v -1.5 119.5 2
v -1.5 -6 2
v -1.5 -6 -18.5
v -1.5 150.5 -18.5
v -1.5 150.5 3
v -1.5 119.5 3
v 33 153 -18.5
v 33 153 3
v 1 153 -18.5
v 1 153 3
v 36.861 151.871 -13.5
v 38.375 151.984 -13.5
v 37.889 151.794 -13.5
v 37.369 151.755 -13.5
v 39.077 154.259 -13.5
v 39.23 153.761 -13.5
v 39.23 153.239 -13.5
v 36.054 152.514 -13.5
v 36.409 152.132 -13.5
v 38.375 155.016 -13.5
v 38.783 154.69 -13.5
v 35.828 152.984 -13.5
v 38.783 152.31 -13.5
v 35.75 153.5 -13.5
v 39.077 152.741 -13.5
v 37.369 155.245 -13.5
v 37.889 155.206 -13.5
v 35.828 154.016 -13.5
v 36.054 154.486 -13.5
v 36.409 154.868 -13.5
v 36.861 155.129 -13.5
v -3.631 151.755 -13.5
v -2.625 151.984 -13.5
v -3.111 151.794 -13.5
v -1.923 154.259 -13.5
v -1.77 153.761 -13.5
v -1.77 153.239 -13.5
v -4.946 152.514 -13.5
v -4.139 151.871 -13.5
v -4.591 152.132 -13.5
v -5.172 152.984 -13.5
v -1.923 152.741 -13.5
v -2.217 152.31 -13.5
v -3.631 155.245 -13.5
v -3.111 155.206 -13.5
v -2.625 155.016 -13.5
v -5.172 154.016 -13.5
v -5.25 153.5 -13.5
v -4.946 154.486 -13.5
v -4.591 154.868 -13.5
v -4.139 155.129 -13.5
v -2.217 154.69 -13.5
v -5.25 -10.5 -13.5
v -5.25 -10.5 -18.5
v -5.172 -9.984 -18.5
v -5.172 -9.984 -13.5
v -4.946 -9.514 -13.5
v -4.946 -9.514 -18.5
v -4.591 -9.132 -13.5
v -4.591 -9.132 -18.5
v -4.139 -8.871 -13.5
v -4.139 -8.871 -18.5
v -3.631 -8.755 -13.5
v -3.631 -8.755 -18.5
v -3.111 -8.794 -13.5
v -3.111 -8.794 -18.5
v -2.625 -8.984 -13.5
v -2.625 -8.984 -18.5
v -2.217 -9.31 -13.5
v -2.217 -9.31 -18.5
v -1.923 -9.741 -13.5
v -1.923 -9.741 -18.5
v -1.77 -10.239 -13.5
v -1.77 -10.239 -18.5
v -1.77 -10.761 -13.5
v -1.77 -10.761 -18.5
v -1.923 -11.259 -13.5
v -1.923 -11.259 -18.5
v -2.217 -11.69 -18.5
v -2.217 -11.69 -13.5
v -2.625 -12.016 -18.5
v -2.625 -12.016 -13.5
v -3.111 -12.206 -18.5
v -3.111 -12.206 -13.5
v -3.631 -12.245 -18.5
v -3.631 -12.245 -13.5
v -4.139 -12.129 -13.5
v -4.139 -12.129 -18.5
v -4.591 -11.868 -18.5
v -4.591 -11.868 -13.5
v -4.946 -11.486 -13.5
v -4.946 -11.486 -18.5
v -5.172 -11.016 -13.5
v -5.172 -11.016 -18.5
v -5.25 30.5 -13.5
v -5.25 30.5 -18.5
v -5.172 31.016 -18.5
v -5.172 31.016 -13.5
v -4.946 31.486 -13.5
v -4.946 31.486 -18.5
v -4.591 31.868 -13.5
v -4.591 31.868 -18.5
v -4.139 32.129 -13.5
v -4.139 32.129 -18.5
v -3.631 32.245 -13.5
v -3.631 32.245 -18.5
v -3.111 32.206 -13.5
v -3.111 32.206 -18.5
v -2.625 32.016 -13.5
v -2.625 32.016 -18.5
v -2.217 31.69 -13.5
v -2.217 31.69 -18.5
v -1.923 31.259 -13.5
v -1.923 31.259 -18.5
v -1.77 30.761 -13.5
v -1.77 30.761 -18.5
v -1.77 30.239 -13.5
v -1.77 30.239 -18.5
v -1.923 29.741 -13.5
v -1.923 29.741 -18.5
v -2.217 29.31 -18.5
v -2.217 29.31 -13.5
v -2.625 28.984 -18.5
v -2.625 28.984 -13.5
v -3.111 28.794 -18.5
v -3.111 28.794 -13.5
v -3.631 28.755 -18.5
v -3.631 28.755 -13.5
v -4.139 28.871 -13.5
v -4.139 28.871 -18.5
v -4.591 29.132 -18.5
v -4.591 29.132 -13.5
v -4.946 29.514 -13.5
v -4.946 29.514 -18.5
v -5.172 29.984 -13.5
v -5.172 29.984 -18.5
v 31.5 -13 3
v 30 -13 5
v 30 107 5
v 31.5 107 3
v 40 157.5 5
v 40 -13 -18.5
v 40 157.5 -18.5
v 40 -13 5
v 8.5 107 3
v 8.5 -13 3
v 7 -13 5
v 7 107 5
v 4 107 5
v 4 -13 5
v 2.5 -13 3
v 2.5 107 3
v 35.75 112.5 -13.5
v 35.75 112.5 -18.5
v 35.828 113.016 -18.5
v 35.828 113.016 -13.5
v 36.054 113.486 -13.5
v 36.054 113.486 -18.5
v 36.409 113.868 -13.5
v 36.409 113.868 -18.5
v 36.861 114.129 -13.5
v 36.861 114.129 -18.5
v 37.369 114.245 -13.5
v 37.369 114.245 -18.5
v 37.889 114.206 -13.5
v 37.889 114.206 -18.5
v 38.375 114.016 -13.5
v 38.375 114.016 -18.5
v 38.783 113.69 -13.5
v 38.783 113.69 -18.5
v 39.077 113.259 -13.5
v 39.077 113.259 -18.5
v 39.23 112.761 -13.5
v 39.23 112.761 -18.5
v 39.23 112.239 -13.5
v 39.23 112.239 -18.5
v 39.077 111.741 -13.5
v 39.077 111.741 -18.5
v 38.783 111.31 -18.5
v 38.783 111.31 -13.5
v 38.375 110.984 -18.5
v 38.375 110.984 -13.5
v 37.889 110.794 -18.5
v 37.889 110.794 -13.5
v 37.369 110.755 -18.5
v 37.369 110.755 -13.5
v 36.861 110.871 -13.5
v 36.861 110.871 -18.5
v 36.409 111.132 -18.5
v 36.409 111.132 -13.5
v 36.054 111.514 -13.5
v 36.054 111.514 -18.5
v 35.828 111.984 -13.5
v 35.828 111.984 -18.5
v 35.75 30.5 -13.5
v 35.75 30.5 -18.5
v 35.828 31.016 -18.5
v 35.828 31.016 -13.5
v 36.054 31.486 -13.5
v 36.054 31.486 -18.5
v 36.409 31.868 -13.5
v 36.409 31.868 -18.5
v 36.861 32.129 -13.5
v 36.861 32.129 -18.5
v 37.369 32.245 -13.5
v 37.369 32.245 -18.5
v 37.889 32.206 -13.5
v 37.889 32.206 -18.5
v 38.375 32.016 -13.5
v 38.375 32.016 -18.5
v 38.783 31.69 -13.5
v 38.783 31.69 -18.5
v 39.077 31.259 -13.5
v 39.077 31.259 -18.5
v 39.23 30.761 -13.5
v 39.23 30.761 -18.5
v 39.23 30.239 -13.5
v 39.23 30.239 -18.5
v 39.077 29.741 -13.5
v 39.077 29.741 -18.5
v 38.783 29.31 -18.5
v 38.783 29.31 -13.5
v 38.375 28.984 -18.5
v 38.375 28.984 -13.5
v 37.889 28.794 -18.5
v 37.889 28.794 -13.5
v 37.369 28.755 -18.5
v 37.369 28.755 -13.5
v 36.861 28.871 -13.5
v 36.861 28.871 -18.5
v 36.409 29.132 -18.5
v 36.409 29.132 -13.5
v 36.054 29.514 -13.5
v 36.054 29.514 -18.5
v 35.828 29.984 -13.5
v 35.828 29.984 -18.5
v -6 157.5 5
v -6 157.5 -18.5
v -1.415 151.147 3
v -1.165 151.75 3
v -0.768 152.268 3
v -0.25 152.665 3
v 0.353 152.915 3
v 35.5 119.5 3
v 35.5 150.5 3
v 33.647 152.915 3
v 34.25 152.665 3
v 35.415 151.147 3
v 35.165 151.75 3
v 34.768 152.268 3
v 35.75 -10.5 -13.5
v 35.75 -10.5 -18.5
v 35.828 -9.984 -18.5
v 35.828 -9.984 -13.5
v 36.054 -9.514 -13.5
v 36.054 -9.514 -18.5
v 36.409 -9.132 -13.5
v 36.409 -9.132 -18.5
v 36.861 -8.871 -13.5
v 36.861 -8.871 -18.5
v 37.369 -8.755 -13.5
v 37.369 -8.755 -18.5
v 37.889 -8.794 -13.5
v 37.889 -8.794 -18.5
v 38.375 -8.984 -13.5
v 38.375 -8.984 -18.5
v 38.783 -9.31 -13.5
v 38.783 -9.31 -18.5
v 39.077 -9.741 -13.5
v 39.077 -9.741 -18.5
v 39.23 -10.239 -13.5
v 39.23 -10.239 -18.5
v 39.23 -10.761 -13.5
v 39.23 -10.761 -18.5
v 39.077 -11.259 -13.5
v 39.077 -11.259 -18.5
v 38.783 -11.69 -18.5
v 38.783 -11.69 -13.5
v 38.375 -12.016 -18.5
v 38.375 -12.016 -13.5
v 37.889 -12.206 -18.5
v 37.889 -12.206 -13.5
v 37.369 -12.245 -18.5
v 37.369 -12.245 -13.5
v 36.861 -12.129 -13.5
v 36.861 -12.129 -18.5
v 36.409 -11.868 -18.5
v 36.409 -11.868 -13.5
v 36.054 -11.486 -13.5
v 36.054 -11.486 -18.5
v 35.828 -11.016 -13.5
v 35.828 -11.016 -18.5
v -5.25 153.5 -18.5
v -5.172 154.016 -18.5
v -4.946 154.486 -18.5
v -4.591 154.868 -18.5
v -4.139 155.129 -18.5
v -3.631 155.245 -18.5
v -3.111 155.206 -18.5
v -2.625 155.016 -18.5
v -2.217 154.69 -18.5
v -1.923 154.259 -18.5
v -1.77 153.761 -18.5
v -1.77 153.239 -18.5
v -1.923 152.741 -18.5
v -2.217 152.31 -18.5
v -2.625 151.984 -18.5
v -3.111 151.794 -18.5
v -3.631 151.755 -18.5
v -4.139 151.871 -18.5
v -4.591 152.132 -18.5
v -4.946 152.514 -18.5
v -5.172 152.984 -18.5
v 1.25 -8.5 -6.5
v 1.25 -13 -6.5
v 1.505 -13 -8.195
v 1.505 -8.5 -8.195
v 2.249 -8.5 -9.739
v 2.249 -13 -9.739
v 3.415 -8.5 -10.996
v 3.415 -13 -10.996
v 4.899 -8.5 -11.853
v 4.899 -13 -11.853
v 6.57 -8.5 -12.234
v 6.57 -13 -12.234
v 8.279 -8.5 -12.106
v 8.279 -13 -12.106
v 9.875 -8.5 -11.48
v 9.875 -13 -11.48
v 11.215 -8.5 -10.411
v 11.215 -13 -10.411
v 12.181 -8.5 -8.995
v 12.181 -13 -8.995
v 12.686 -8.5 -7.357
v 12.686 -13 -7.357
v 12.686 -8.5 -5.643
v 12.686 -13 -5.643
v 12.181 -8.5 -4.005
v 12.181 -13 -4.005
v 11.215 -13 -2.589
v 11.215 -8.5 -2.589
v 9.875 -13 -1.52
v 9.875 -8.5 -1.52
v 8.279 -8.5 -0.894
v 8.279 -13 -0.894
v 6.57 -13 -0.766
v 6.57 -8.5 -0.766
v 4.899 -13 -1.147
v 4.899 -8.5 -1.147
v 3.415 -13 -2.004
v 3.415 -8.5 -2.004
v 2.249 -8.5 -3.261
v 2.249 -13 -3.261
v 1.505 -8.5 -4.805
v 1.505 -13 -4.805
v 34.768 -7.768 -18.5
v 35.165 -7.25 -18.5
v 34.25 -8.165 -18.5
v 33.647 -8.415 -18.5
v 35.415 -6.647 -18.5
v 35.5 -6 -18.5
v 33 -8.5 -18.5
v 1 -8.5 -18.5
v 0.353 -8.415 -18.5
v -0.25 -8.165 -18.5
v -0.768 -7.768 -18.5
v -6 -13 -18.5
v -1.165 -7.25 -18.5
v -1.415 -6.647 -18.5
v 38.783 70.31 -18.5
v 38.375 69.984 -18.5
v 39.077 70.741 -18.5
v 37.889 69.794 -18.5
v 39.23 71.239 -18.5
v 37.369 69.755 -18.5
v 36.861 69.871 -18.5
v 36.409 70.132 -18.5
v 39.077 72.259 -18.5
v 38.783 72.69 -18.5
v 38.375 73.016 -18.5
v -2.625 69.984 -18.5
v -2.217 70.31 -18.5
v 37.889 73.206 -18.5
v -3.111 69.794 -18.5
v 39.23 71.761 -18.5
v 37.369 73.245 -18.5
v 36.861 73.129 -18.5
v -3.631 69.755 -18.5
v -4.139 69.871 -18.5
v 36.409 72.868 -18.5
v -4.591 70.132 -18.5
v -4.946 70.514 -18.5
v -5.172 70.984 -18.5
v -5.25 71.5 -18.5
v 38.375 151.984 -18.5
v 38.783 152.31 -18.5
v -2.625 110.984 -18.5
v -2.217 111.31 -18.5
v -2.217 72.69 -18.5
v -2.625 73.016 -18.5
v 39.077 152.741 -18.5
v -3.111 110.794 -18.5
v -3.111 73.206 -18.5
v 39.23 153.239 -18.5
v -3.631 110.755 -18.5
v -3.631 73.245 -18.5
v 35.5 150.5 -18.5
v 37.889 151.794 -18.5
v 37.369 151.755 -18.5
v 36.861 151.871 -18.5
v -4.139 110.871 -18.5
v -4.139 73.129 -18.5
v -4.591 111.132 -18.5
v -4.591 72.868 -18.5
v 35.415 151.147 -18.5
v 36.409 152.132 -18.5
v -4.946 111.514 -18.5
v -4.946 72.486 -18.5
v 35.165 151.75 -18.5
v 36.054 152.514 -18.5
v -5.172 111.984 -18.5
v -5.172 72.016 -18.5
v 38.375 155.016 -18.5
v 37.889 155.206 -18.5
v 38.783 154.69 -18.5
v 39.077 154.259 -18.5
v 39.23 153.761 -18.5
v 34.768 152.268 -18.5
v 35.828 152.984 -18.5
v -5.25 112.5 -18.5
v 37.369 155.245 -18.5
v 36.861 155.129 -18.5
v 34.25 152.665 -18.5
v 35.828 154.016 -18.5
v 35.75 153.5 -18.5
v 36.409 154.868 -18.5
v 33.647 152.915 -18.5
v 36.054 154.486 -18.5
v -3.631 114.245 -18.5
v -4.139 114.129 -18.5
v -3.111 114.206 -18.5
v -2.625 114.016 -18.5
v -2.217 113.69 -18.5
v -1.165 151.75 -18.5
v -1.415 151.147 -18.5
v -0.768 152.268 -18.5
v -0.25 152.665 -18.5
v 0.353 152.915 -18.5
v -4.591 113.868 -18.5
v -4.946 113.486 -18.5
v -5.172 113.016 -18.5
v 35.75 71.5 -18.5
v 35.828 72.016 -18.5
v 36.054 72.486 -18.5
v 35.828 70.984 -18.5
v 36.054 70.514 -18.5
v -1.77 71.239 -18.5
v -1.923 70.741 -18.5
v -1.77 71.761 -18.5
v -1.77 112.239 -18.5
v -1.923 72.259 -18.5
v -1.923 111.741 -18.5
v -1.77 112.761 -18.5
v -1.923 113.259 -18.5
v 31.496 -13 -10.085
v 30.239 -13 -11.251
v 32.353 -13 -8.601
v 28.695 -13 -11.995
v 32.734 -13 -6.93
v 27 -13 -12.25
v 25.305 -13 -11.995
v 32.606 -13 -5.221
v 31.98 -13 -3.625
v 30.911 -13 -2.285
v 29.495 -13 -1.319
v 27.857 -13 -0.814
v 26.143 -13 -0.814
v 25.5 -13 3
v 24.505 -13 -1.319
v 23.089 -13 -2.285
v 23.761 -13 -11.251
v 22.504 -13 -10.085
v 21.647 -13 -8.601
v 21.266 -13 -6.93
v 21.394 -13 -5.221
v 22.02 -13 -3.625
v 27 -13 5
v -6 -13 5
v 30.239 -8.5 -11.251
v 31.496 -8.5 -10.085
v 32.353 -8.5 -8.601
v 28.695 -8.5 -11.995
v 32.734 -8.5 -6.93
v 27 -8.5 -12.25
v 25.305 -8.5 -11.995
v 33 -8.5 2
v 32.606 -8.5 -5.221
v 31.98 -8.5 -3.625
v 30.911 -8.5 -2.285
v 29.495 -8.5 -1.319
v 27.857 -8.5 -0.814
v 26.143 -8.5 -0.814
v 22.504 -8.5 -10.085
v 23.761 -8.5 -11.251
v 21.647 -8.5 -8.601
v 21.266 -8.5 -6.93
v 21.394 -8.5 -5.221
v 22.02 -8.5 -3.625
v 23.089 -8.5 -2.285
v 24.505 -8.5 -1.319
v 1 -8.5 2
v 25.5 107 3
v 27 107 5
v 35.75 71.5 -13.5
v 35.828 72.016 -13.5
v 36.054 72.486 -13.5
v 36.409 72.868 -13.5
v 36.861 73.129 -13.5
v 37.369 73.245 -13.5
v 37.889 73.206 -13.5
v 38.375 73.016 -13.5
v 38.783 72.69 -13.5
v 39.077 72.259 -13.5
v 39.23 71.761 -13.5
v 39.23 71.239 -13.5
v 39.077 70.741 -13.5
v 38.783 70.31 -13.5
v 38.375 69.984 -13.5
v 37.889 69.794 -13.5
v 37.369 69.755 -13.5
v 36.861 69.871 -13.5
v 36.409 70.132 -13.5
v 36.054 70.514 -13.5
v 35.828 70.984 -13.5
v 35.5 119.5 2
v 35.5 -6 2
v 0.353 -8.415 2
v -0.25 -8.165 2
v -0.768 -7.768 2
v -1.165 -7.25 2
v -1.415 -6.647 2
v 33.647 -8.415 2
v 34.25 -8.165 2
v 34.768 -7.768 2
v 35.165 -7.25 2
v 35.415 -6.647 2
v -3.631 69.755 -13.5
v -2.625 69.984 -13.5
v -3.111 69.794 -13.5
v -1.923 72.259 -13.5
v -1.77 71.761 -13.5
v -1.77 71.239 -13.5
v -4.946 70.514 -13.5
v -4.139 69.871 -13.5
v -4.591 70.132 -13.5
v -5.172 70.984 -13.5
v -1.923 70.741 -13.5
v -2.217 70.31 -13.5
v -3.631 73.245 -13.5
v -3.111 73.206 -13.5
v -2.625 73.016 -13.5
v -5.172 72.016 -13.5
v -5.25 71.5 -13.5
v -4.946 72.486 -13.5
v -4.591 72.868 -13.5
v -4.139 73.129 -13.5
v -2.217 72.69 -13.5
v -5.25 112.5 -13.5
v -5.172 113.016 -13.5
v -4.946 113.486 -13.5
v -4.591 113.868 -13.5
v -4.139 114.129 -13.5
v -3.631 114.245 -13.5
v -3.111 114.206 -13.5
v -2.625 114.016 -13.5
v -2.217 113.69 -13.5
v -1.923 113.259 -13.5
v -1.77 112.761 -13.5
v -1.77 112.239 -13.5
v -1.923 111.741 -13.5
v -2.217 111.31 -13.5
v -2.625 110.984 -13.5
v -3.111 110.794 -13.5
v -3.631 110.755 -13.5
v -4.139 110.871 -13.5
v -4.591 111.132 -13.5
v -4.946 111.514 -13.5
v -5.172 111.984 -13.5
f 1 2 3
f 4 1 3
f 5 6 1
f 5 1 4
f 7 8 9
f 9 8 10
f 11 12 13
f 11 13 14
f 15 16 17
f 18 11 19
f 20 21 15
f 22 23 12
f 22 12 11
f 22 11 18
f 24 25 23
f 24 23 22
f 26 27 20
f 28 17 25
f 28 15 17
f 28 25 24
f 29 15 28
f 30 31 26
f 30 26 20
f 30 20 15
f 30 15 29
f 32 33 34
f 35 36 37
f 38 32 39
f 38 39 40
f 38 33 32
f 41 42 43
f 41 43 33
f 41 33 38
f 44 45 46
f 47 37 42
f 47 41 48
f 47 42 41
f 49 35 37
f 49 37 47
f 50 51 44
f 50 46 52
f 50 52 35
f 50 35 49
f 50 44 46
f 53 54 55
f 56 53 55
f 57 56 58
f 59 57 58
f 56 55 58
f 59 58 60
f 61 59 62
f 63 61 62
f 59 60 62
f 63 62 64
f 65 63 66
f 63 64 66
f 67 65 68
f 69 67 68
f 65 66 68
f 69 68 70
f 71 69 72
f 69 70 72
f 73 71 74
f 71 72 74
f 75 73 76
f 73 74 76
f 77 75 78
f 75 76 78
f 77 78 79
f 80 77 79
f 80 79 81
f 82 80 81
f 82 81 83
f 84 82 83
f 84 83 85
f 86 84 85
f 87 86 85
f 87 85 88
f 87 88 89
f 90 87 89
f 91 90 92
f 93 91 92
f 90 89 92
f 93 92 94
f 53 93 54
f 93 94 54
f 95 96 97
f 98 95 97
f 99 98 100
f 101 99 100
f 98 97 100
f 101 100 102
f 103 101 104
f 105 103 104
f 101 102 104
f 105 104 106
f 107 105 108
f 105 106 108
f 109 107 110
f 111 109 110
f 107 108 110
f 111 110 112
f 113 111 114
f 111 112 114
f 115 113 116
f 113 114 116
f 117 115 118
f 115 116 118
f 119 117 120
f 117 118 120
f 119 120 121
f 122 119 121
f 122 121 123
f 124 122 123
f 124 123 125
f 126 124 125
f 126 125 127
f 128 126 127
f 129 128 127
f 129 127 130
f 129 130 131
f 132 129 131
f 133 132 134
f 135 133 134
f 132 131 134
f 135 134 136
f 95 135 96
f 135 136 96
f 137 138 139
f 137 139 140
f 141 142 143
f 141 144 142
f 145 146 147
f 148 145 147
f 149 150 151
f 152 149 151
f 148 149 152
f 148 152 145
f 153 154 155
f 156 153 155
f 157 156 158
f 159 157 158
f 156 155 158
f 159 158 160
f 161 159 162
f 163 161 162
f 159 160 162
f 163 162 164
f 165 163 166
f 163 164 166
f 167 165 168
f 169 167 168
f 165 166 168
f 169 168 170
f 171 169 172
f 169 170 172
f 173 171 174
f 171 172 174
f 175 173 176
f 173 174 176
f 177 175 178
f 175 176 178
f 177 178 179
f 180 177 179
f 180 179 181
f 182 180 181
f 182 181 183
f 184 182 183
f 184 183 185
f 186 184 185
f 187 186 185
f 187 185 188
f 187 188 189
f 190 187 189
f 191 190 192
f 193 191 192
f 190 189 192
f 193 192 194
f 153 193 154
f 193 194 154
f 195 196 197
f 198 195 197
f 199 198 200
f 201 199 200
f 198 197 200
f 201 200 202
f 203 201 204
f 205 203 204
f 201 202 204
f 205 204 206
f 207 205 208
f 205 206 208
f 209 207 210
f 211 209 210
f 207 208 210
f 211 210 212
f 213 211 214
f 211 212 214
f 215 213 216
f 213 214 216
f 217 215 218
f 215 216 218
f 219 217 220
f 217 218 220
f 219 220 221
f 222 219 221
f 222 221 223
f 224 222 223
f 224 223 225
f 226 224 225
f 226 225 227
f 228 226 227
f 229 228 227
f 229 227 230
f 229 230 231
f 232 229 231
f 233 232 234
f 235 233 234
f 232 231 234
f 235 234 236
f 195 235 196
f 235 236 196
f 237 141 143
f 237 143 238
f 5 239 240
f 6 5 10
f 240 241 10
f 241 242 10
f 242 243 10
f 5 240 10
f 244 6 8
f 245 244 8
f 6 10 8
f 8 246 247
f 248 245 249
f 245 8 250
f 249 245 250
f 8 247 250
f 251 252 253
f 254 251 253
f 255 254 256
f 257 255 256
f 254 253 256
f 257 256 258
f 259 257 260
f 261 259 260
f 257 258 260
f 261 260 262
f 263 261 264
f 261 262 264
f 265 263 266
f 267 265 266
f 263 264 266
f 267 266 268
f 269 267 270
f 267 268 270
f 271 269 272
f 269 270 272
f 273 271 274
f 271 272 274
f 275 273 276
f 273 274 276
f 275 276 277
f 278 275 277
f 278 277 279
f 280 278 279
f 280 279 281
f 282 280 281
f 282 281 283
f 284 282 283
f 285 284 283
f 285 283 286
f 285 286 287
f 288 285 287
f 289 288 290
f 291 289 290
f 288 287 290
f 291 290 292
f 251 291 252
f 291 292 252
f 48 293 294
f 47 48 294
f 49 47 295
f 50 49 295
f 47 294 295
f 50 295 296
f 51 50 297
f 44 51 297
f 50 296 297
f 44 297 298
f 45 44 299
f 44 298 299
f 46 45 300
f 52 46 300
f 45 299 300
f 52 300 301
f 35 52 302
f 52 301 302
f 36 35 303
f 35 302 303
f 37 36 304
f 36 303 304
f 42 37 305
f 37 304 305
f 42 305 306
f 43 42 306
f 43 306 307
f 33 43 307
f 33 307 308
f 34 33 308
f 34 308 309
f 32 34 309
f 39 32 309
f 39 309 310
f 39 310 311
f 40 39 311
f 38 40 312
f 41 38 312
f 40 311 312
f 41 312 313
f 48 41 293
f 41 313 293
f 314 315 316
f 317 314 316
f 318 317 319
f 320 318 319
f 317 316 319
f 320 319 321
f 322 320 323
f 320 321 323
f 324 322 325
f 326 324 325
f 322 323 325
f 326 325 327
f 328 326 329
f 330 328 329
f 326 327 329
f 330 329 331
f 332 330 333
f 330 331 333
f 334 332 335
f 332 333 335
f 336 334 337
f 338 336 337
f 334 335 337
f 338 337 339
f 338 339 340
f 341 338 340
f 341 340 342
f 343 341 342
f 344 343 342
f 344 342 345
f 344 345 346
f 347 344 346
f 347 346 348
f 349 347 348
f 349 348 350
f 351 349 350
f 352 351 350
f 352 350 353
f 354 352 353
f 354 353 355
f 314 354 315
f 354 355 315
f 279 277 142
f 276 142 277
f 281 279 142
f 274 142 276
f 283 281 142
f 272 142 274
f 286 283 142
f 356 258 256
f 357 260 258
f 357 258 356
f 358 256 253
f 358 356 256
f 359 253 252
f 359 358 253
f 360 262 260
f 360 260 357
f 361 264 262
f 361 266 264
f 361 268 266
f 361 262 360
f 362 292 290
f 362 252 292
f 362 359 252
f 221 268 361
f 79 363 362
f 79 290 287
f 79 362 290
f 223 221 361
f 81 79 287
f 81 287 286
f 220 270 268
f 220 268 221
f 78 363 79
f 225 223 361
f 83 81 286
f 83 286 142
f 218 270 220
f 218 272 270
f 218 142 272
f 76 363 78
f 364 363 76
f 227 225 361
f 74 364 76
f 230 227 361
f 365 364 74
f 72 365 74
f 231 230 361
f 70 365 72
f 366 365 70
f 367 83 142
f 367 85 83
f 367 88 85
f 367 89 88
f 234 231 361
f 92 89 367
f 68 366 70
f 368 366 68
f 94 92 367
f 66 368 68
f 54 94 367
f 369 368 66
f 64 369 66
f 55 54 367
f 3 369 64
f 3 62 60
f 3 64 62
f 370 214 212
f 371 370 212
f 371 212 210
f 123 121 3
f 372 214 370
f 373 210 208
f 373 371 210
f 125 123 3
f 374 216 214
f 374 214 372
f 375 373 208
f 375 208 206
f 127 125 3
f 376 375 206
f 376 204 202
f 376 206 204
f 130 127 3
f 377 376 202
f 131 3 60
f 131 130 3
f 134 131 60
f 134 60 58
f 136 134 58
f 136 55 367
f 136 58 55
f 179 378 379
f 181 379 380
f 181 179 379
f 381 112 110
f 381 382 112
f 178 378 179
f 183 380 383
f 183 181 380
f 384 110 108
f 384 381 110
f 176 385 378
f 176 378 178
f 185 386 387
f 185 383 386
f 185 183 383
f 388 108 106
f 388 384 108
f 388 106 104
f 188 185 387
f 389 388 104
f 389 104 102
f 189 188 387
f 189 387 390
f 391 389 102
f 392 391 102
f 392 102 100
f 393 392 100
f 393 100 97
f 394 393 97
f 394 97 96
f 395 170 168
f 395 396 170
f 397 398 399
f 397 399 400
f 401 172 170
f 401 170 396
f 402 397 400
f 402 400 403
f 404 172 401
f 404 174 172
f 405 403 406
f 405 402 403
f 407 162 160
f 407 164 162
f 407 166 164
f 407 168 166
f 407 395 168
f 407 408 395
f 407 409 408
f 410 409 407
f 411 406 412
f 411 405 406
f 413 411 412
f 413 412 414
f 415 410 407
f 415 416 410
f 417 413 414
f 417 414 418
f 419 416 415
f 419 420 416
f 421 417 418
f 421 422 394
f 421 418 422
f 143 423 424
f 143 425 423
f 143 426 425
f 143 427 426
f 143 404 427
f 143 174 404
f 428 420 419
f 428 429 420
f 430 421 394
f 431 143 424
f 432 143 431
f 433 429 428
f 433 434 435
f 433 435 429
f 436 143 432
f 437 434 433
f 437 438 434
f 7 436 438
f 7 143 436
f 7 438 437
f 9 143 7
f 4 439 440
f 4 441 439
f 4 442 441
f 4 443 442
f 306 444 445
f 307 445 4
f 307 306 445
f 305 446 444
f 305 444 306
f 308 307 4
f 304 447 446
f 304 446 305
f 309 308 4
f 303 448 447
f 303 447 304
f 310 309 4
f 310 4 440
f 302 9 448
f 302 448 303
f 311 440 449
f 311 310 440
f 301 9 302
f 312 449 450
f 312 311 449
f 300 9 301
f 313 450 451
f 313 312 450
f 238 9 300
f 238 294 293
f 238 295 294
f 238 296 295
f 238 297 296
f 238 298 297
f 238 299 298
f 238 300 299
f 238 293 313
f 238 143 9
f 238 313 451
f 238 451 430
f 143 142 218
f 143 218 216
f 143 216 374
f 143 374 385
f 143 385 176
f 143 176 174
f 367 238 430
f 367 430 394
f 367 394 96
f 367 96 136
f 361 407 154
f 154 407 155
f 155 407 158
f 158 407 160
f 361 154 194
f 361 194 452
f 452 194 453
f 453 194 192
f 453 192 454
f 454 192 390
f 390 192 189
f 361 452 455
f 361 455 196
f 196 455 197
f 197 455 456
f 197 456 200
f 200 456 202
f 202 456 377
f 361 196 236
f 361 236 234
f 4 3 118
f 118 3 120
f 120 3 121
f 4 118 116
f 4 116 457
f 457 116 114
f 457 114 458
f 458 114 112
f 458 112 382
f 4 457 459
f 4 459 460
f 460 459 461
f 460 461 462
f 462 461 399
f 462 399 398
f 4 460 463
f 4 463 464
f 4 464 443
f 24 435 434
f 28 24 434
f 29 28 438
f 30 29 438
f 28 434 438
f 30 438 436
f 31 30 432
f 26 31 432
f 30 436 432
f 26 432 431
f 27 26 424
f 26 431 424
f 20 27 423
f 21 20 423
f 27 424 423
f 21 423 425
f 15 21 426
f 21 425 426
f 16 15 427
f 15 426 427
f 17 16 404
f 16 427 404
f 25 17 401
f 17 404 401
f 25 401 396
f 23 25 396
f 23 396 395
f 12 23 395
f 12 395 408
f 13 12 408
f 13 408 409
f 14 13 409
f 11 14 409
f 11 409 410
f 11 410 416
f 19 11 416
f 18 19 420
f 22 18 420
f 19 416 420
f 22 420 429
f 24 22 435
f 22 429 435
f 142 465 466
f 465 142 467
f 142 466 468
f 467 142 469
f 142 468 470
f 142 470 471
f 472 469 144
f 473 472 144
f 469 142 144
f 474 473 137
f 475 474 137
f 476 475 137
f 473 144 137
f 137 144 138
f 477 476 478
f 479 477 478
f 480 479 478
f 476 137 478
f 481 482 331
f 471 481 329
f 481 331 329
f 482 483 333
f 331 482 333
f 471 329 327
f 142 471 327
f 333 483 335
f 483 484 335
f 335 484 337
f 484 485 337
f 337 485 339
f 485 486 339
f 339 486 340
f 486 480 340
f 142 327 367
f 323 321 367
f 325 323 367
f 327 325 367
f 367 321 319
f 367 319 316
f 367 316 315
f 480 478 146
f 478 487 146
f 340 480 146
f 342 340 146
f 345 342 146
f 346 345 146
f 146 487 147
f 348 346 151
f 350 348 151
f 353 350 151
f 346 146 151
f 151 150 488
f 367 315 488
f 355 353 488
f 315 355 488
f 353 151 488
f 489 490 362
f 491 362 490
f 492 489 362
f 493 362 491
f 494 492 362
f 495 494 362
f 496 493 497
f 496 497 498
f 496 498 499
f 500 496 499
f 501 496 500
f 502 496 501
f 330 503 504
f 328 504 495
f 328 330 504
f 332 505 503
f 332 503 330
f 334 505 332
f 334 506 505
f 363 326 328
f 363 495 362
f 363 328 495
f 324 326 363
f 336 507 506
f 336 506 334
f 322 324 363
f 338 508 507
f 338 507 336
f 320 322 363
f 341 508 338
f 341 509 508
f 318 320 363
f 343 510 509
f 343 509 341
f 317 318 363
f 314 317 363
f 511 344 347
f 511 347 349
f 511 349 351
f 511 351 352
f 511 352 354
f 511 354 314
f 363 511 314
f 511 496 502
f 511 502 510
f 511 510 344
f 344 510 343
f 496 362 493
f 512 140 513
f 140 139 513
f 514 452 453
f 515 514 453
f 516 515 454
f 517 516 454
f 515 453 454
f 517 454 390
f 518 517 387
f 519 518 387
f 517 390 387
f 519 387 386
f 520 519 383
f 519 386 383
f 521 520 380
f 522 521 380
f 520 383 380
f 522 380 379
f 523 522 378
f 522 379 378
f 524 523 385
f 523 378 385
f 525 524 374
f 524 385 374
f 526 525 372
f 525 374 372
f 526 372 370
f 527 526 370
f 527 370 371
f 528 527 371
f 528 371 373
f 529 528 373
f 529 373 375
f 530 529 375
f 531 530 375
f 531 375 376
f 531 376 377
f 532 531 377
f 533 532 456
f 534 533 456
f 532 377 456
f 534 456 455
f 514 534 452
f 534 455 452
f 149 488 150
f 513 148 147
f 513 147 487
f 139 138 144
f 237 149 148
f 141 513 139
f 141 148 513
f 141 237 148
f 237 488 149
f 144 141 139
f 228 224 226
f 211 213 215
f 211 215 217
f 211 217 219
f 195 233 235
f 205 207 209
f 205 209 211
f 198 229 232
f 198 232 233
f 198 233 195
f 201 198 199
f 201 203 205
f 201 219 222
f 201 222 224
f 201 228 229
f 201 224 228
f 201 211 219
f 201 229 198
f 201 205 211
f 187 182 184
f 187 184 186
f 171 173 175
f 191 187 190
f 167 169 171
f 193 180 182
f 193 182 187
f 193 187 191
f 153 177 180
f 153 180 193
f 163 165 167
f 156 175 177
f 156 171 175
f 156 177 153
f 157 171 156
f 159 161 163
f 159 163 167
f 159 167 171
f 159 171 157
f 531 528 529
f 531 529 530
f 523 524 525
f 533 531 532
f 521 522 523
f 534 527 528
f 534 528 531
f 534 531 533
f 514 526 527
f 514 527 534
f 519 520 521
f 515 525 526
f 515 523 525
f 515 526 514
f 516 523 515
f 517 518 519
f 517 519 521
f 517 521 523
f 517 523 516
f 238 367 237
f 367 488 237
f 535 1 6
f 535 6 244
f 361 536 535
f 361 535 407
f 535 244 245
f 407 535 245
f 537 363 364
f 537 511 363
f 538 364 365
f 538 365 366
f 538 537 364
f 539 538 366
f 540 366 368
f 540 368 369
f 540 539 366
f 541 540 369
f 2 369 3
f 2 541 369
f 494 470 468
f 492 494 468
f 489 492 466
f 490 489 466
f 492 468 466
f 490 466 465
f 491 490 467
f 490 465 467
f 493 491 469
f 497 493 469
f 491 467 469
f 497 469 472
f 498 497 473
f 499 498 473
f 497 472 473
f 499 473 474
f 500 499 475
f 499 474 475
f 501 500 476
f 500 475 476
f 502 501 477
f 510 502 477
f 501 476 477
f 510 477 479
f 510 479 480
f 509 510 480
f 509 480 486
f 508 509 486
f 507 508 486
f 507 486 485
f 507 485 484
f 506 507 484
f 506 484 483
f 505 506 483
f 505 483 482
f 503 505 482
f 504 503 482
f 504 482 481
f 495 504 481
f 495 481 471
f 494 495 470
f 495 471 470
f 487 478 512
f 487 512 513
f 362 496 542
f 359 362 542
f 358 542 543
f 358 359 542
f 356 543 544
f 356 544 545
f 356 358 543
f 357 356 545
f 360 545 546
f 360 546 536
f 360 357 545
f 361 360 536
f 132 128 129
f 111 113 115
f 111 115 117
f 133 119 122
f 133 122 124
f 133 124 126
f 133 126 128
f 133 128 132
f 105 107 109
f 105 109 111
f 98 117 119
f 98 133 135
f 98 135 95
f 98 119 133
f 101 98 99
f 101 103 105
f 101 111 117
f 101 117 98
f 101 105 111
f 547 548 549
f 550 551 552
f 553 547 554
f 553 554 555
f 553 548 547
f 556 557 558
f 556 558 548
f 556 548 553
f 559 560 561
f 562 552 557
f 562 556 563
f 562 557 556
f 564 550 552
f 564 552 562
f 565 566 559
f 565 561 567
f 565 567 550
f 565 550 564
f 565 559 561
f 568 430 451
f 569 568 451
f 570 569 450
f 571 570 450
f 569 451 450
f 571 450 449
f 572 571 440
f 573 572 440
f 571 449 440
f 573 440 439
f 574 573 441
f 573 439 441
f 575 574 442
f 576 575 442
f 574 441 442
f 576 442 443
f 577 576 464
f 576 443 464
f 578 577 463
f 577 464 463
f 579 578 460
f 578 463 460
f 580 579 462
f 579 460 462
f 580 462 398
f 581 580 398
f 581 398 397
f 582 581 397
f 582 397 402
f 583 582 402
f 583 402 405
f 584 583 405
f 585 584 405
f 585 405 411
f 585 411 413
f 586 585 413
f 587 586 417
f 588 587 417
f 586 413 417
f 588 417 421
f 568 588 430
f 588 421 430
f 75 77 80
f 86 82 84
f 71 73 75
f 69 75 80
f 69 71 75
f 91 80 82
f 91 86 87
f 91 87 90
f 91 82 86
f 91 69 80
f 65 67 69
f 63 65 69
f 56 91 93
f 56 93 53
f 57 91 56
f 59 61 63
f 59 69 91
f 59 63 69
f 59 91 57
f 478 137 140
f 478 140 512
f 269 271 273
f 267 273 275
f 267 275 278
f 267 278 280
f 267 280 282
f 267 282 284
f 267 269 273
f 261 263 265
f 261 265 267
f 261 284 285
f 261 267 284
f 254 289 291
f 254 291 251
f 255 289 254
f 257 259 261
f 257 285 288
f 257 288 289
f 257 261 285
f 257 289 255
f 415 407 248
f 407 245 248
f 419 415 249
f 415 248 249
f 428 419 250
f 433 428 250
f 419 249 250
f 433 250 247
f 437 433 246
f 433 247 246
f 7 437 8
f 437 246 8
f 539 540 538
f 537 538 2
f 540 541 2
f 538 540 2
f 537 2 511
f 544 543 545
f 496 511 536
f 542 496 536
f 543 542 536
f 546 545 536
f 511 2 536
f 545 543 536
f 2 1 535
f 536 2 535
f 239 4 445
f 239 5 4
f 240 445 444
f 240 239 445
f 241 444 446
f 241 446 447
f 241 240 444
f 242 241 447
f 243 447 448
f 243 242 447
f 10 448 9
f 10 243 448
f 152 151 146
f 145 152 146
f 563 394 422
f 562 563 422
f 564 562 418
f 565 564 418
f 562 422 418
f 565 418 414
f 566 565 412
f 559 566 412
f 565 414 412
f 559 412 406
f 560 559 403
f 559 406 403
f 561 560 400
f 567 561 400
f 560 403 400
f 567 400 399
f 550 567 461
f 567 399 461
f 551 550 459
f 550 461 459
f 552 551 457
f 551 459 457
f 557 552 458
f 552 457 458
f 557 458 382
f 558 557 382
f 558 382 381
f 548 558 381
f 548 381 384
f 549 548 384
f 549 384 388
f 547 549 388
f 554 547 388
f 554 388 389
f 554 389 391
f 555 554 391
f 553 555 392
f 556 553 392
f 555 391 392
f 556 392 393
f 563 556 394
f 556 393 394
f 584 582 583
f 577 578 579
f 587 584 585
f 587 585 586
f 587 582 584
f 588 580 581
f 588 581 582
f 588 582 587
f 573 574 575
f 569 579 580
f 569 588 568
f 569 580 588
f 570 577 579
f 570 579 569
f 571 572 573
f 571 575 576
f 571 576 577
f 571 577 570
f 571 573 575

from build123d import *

# Parameters (mm, degrees)
P_IDAT_VYSUNUT_M2_DEPTH     = 16.5
SKICA2_W                    = 46
SKICA2_H                    = 170.5
SKICA2_W_2                  = 37
SKICA2_H_2                  = 161.5
P_IDAT_VYSUNUT_M4_DEPTH     = 2
SKICA3_W                    = 46
SKICA3_H                    = 170.5
SKICA3_W_2                  = 37
SKICA3_H_2                  = 33.5
P_IDAT_VYSUNUT_M5_DEPTH     = 3
SKICA4_W                    = 37
SKICA4_H                    = 33.5
P_IDAT_VYSUNUT_M6_DEPTH     = 2
SKICA9_W                    = 46
SKICA9_H                    = 170.5
SKICA9_W_2                  = 37
SKICA9_H_2                  = 161.5
P_IDAT_VYSUNUT_M9_DEPTH     = 2
SKICA10_R                   = 1.75
D_RY_NA_Z_PUSTN_MATKY_DEPTH = 5
ZAOBLIT1_R                  = 2.5
SKICA11_R                   = 5.75
KONEKTORY_DEPTH             = 4.5
DR_KA_K_TER_U_DEPTH         = 120


with BuildPart() as part:
    # Skica1 → Přidat vysunutím2 (new body)
    with BuildSketch(Plane.XY):
        Polygon((40, 157.5), (-6, 157.5), (-6, 0), (-6, -13), (40, -13), (40, 0), align=None)
        Polygon((-1.5, 0), (-1.5, 153), (35.5, 153), (35.5, 0), (35.5, -8.5), (-1.5, -8.5), align=None, mode=Mode.SUBTRACT)
    extrude(amount=-P_IDAT_VYSUNUT_M2_DEPTH)

    # Skica2 → Přidat vysunutím4 (add)
    with BuildSketch(Plane.XY):
        with Locations((17, 72.25)):
            Rectangle(SKICA2_W, SKICA2_H)
        with Locations((17, 72.25)):
            Rectangle(SKICA2_W_2, SKICA2_H_2, mode=Mode.SUBTRACT)
    extrude(amount=P_IDAT_VYSUNUT_M4_DEPTH)

    # Skica3 → Přidat vysunutím5 (add)
    with BuildSketch(Plane.XY.offset(2)):
        with Locations((17, 72.25)):
            Rectangle(SKICA3_W, SKICA3_H)
        with Locations((17, 136.25)):
            Rectangle(SKICA3_W_2, SKICA3_H_2, mode=Mode.SUBTRACT)
    extrude(amount=P_IDAT_VYSUNUT_M5_DEPTH)

    # Skica4 → Přidat vysunutím6 (add)
    with BuildSketch(Plane.XY.offset(5)):
        with Locations((17, 136.25)):
            Rectangle(SKICA4_W, SKICA4_H)
    extrude(amount=-P_IDAT_VYSUNUT_M6_DEPTH)

    # Skica9 → Přidat vysunutím9 (add)
    with BuildSketch(Plane(origin=(0, 0, -16.5), x_dir=(-1, 0, 0), z_dir=(0, 0, -1))):
        with Locations((-17, 72.25)):
            Rectangle(SKICA9_W, SKICA9_H)
        with Locations((-17, 72.25)):
            Rectangle(SKICA9_W_2, SKICA9_H_2, mode=Mode.SUBTRACT)
    extrude(amount=P_IDAT_VYSUNUT_M9_DEPTH)

    # Skica10 → Díry na zápustný matky (cut)
    with BuildSketch(Plane(origin=(0, 0, -18.5), x_dir=(-1, 0, 0), z_dir=(0, 0, -1))):
        with Locations((3.5, -10.5)):
            Circle(SKICA10_R)
        with Locations((-37.5, -10.5)):
            Circle(SKICA10_R)
        with Locations((-37.5, 30.5)):
            Circle(SKICA10_R)
        with Locations((-37.5, 71.5)):
            Circle(SKICA10_R)
        with Locations((-37.5, 112.5)):
            Circle(SKICA10_R)
        with Locations((-37.5, 153.5)):
            Circle(SKICA10_R)
        with Locations((3.5, 30.5)):
            Circle(SKICA10_R)
        with Locations((3.5, 71.5)):
            Circle(SKICA10_R)
        with Locations((3.5, 112.5)):
            Circle(SKICA10_R)
        with Locations((3.5, 153.5)):
            Circle(SKICA10_R)
    extrude(amount=-D_RY_NA_Z_PUSTN_MATKY_DEPTH, mode=Mode.SUBTRACT)

    # Zaoblit1
    zaoblit1_edges = [part.edges().sort_by_distance(p)[0] for p in [
        (-1.5, 153, -7.75),
        (35.5, 153, -7.75),
        (35.5, -8.5, -8.25),
        (-1.5, -8.5, -8.25),
    ]]
    fillet(zaoblit1_edges, radius=ZAOBLIT1_R)

    # Skica11 → konektory (cut)
    with BuildSketch(Plane.XZ.offset(13)):
        with Locations(Location((27, -6.5, 0), (0, 0, 270))):
            Circle(SKICA11_R)
        with Locations(Location((7, -6.5, 0), (0, 0, 180))):
            Circle(SKICA11_R)
    extrude(amount=-KONEKTORY_DEPTH, mode=Mode.SUBTRACT)

    # Skica13 → Drážka k terču (cut)
    with BuildSketch(Plane.XZ.offset(13)):
        Polygon((31.5, 3), (25.5, 3), (27, 5), (30, 5), align=None)
        Polygon((7, 5), (4, 5), (2.5, 3), (8.5, 3), align=None)
    extrude(amount=-DR_KA_K_TER_U_DEPTH, mode=Mode.SUBTRACT)


solid = part.part
